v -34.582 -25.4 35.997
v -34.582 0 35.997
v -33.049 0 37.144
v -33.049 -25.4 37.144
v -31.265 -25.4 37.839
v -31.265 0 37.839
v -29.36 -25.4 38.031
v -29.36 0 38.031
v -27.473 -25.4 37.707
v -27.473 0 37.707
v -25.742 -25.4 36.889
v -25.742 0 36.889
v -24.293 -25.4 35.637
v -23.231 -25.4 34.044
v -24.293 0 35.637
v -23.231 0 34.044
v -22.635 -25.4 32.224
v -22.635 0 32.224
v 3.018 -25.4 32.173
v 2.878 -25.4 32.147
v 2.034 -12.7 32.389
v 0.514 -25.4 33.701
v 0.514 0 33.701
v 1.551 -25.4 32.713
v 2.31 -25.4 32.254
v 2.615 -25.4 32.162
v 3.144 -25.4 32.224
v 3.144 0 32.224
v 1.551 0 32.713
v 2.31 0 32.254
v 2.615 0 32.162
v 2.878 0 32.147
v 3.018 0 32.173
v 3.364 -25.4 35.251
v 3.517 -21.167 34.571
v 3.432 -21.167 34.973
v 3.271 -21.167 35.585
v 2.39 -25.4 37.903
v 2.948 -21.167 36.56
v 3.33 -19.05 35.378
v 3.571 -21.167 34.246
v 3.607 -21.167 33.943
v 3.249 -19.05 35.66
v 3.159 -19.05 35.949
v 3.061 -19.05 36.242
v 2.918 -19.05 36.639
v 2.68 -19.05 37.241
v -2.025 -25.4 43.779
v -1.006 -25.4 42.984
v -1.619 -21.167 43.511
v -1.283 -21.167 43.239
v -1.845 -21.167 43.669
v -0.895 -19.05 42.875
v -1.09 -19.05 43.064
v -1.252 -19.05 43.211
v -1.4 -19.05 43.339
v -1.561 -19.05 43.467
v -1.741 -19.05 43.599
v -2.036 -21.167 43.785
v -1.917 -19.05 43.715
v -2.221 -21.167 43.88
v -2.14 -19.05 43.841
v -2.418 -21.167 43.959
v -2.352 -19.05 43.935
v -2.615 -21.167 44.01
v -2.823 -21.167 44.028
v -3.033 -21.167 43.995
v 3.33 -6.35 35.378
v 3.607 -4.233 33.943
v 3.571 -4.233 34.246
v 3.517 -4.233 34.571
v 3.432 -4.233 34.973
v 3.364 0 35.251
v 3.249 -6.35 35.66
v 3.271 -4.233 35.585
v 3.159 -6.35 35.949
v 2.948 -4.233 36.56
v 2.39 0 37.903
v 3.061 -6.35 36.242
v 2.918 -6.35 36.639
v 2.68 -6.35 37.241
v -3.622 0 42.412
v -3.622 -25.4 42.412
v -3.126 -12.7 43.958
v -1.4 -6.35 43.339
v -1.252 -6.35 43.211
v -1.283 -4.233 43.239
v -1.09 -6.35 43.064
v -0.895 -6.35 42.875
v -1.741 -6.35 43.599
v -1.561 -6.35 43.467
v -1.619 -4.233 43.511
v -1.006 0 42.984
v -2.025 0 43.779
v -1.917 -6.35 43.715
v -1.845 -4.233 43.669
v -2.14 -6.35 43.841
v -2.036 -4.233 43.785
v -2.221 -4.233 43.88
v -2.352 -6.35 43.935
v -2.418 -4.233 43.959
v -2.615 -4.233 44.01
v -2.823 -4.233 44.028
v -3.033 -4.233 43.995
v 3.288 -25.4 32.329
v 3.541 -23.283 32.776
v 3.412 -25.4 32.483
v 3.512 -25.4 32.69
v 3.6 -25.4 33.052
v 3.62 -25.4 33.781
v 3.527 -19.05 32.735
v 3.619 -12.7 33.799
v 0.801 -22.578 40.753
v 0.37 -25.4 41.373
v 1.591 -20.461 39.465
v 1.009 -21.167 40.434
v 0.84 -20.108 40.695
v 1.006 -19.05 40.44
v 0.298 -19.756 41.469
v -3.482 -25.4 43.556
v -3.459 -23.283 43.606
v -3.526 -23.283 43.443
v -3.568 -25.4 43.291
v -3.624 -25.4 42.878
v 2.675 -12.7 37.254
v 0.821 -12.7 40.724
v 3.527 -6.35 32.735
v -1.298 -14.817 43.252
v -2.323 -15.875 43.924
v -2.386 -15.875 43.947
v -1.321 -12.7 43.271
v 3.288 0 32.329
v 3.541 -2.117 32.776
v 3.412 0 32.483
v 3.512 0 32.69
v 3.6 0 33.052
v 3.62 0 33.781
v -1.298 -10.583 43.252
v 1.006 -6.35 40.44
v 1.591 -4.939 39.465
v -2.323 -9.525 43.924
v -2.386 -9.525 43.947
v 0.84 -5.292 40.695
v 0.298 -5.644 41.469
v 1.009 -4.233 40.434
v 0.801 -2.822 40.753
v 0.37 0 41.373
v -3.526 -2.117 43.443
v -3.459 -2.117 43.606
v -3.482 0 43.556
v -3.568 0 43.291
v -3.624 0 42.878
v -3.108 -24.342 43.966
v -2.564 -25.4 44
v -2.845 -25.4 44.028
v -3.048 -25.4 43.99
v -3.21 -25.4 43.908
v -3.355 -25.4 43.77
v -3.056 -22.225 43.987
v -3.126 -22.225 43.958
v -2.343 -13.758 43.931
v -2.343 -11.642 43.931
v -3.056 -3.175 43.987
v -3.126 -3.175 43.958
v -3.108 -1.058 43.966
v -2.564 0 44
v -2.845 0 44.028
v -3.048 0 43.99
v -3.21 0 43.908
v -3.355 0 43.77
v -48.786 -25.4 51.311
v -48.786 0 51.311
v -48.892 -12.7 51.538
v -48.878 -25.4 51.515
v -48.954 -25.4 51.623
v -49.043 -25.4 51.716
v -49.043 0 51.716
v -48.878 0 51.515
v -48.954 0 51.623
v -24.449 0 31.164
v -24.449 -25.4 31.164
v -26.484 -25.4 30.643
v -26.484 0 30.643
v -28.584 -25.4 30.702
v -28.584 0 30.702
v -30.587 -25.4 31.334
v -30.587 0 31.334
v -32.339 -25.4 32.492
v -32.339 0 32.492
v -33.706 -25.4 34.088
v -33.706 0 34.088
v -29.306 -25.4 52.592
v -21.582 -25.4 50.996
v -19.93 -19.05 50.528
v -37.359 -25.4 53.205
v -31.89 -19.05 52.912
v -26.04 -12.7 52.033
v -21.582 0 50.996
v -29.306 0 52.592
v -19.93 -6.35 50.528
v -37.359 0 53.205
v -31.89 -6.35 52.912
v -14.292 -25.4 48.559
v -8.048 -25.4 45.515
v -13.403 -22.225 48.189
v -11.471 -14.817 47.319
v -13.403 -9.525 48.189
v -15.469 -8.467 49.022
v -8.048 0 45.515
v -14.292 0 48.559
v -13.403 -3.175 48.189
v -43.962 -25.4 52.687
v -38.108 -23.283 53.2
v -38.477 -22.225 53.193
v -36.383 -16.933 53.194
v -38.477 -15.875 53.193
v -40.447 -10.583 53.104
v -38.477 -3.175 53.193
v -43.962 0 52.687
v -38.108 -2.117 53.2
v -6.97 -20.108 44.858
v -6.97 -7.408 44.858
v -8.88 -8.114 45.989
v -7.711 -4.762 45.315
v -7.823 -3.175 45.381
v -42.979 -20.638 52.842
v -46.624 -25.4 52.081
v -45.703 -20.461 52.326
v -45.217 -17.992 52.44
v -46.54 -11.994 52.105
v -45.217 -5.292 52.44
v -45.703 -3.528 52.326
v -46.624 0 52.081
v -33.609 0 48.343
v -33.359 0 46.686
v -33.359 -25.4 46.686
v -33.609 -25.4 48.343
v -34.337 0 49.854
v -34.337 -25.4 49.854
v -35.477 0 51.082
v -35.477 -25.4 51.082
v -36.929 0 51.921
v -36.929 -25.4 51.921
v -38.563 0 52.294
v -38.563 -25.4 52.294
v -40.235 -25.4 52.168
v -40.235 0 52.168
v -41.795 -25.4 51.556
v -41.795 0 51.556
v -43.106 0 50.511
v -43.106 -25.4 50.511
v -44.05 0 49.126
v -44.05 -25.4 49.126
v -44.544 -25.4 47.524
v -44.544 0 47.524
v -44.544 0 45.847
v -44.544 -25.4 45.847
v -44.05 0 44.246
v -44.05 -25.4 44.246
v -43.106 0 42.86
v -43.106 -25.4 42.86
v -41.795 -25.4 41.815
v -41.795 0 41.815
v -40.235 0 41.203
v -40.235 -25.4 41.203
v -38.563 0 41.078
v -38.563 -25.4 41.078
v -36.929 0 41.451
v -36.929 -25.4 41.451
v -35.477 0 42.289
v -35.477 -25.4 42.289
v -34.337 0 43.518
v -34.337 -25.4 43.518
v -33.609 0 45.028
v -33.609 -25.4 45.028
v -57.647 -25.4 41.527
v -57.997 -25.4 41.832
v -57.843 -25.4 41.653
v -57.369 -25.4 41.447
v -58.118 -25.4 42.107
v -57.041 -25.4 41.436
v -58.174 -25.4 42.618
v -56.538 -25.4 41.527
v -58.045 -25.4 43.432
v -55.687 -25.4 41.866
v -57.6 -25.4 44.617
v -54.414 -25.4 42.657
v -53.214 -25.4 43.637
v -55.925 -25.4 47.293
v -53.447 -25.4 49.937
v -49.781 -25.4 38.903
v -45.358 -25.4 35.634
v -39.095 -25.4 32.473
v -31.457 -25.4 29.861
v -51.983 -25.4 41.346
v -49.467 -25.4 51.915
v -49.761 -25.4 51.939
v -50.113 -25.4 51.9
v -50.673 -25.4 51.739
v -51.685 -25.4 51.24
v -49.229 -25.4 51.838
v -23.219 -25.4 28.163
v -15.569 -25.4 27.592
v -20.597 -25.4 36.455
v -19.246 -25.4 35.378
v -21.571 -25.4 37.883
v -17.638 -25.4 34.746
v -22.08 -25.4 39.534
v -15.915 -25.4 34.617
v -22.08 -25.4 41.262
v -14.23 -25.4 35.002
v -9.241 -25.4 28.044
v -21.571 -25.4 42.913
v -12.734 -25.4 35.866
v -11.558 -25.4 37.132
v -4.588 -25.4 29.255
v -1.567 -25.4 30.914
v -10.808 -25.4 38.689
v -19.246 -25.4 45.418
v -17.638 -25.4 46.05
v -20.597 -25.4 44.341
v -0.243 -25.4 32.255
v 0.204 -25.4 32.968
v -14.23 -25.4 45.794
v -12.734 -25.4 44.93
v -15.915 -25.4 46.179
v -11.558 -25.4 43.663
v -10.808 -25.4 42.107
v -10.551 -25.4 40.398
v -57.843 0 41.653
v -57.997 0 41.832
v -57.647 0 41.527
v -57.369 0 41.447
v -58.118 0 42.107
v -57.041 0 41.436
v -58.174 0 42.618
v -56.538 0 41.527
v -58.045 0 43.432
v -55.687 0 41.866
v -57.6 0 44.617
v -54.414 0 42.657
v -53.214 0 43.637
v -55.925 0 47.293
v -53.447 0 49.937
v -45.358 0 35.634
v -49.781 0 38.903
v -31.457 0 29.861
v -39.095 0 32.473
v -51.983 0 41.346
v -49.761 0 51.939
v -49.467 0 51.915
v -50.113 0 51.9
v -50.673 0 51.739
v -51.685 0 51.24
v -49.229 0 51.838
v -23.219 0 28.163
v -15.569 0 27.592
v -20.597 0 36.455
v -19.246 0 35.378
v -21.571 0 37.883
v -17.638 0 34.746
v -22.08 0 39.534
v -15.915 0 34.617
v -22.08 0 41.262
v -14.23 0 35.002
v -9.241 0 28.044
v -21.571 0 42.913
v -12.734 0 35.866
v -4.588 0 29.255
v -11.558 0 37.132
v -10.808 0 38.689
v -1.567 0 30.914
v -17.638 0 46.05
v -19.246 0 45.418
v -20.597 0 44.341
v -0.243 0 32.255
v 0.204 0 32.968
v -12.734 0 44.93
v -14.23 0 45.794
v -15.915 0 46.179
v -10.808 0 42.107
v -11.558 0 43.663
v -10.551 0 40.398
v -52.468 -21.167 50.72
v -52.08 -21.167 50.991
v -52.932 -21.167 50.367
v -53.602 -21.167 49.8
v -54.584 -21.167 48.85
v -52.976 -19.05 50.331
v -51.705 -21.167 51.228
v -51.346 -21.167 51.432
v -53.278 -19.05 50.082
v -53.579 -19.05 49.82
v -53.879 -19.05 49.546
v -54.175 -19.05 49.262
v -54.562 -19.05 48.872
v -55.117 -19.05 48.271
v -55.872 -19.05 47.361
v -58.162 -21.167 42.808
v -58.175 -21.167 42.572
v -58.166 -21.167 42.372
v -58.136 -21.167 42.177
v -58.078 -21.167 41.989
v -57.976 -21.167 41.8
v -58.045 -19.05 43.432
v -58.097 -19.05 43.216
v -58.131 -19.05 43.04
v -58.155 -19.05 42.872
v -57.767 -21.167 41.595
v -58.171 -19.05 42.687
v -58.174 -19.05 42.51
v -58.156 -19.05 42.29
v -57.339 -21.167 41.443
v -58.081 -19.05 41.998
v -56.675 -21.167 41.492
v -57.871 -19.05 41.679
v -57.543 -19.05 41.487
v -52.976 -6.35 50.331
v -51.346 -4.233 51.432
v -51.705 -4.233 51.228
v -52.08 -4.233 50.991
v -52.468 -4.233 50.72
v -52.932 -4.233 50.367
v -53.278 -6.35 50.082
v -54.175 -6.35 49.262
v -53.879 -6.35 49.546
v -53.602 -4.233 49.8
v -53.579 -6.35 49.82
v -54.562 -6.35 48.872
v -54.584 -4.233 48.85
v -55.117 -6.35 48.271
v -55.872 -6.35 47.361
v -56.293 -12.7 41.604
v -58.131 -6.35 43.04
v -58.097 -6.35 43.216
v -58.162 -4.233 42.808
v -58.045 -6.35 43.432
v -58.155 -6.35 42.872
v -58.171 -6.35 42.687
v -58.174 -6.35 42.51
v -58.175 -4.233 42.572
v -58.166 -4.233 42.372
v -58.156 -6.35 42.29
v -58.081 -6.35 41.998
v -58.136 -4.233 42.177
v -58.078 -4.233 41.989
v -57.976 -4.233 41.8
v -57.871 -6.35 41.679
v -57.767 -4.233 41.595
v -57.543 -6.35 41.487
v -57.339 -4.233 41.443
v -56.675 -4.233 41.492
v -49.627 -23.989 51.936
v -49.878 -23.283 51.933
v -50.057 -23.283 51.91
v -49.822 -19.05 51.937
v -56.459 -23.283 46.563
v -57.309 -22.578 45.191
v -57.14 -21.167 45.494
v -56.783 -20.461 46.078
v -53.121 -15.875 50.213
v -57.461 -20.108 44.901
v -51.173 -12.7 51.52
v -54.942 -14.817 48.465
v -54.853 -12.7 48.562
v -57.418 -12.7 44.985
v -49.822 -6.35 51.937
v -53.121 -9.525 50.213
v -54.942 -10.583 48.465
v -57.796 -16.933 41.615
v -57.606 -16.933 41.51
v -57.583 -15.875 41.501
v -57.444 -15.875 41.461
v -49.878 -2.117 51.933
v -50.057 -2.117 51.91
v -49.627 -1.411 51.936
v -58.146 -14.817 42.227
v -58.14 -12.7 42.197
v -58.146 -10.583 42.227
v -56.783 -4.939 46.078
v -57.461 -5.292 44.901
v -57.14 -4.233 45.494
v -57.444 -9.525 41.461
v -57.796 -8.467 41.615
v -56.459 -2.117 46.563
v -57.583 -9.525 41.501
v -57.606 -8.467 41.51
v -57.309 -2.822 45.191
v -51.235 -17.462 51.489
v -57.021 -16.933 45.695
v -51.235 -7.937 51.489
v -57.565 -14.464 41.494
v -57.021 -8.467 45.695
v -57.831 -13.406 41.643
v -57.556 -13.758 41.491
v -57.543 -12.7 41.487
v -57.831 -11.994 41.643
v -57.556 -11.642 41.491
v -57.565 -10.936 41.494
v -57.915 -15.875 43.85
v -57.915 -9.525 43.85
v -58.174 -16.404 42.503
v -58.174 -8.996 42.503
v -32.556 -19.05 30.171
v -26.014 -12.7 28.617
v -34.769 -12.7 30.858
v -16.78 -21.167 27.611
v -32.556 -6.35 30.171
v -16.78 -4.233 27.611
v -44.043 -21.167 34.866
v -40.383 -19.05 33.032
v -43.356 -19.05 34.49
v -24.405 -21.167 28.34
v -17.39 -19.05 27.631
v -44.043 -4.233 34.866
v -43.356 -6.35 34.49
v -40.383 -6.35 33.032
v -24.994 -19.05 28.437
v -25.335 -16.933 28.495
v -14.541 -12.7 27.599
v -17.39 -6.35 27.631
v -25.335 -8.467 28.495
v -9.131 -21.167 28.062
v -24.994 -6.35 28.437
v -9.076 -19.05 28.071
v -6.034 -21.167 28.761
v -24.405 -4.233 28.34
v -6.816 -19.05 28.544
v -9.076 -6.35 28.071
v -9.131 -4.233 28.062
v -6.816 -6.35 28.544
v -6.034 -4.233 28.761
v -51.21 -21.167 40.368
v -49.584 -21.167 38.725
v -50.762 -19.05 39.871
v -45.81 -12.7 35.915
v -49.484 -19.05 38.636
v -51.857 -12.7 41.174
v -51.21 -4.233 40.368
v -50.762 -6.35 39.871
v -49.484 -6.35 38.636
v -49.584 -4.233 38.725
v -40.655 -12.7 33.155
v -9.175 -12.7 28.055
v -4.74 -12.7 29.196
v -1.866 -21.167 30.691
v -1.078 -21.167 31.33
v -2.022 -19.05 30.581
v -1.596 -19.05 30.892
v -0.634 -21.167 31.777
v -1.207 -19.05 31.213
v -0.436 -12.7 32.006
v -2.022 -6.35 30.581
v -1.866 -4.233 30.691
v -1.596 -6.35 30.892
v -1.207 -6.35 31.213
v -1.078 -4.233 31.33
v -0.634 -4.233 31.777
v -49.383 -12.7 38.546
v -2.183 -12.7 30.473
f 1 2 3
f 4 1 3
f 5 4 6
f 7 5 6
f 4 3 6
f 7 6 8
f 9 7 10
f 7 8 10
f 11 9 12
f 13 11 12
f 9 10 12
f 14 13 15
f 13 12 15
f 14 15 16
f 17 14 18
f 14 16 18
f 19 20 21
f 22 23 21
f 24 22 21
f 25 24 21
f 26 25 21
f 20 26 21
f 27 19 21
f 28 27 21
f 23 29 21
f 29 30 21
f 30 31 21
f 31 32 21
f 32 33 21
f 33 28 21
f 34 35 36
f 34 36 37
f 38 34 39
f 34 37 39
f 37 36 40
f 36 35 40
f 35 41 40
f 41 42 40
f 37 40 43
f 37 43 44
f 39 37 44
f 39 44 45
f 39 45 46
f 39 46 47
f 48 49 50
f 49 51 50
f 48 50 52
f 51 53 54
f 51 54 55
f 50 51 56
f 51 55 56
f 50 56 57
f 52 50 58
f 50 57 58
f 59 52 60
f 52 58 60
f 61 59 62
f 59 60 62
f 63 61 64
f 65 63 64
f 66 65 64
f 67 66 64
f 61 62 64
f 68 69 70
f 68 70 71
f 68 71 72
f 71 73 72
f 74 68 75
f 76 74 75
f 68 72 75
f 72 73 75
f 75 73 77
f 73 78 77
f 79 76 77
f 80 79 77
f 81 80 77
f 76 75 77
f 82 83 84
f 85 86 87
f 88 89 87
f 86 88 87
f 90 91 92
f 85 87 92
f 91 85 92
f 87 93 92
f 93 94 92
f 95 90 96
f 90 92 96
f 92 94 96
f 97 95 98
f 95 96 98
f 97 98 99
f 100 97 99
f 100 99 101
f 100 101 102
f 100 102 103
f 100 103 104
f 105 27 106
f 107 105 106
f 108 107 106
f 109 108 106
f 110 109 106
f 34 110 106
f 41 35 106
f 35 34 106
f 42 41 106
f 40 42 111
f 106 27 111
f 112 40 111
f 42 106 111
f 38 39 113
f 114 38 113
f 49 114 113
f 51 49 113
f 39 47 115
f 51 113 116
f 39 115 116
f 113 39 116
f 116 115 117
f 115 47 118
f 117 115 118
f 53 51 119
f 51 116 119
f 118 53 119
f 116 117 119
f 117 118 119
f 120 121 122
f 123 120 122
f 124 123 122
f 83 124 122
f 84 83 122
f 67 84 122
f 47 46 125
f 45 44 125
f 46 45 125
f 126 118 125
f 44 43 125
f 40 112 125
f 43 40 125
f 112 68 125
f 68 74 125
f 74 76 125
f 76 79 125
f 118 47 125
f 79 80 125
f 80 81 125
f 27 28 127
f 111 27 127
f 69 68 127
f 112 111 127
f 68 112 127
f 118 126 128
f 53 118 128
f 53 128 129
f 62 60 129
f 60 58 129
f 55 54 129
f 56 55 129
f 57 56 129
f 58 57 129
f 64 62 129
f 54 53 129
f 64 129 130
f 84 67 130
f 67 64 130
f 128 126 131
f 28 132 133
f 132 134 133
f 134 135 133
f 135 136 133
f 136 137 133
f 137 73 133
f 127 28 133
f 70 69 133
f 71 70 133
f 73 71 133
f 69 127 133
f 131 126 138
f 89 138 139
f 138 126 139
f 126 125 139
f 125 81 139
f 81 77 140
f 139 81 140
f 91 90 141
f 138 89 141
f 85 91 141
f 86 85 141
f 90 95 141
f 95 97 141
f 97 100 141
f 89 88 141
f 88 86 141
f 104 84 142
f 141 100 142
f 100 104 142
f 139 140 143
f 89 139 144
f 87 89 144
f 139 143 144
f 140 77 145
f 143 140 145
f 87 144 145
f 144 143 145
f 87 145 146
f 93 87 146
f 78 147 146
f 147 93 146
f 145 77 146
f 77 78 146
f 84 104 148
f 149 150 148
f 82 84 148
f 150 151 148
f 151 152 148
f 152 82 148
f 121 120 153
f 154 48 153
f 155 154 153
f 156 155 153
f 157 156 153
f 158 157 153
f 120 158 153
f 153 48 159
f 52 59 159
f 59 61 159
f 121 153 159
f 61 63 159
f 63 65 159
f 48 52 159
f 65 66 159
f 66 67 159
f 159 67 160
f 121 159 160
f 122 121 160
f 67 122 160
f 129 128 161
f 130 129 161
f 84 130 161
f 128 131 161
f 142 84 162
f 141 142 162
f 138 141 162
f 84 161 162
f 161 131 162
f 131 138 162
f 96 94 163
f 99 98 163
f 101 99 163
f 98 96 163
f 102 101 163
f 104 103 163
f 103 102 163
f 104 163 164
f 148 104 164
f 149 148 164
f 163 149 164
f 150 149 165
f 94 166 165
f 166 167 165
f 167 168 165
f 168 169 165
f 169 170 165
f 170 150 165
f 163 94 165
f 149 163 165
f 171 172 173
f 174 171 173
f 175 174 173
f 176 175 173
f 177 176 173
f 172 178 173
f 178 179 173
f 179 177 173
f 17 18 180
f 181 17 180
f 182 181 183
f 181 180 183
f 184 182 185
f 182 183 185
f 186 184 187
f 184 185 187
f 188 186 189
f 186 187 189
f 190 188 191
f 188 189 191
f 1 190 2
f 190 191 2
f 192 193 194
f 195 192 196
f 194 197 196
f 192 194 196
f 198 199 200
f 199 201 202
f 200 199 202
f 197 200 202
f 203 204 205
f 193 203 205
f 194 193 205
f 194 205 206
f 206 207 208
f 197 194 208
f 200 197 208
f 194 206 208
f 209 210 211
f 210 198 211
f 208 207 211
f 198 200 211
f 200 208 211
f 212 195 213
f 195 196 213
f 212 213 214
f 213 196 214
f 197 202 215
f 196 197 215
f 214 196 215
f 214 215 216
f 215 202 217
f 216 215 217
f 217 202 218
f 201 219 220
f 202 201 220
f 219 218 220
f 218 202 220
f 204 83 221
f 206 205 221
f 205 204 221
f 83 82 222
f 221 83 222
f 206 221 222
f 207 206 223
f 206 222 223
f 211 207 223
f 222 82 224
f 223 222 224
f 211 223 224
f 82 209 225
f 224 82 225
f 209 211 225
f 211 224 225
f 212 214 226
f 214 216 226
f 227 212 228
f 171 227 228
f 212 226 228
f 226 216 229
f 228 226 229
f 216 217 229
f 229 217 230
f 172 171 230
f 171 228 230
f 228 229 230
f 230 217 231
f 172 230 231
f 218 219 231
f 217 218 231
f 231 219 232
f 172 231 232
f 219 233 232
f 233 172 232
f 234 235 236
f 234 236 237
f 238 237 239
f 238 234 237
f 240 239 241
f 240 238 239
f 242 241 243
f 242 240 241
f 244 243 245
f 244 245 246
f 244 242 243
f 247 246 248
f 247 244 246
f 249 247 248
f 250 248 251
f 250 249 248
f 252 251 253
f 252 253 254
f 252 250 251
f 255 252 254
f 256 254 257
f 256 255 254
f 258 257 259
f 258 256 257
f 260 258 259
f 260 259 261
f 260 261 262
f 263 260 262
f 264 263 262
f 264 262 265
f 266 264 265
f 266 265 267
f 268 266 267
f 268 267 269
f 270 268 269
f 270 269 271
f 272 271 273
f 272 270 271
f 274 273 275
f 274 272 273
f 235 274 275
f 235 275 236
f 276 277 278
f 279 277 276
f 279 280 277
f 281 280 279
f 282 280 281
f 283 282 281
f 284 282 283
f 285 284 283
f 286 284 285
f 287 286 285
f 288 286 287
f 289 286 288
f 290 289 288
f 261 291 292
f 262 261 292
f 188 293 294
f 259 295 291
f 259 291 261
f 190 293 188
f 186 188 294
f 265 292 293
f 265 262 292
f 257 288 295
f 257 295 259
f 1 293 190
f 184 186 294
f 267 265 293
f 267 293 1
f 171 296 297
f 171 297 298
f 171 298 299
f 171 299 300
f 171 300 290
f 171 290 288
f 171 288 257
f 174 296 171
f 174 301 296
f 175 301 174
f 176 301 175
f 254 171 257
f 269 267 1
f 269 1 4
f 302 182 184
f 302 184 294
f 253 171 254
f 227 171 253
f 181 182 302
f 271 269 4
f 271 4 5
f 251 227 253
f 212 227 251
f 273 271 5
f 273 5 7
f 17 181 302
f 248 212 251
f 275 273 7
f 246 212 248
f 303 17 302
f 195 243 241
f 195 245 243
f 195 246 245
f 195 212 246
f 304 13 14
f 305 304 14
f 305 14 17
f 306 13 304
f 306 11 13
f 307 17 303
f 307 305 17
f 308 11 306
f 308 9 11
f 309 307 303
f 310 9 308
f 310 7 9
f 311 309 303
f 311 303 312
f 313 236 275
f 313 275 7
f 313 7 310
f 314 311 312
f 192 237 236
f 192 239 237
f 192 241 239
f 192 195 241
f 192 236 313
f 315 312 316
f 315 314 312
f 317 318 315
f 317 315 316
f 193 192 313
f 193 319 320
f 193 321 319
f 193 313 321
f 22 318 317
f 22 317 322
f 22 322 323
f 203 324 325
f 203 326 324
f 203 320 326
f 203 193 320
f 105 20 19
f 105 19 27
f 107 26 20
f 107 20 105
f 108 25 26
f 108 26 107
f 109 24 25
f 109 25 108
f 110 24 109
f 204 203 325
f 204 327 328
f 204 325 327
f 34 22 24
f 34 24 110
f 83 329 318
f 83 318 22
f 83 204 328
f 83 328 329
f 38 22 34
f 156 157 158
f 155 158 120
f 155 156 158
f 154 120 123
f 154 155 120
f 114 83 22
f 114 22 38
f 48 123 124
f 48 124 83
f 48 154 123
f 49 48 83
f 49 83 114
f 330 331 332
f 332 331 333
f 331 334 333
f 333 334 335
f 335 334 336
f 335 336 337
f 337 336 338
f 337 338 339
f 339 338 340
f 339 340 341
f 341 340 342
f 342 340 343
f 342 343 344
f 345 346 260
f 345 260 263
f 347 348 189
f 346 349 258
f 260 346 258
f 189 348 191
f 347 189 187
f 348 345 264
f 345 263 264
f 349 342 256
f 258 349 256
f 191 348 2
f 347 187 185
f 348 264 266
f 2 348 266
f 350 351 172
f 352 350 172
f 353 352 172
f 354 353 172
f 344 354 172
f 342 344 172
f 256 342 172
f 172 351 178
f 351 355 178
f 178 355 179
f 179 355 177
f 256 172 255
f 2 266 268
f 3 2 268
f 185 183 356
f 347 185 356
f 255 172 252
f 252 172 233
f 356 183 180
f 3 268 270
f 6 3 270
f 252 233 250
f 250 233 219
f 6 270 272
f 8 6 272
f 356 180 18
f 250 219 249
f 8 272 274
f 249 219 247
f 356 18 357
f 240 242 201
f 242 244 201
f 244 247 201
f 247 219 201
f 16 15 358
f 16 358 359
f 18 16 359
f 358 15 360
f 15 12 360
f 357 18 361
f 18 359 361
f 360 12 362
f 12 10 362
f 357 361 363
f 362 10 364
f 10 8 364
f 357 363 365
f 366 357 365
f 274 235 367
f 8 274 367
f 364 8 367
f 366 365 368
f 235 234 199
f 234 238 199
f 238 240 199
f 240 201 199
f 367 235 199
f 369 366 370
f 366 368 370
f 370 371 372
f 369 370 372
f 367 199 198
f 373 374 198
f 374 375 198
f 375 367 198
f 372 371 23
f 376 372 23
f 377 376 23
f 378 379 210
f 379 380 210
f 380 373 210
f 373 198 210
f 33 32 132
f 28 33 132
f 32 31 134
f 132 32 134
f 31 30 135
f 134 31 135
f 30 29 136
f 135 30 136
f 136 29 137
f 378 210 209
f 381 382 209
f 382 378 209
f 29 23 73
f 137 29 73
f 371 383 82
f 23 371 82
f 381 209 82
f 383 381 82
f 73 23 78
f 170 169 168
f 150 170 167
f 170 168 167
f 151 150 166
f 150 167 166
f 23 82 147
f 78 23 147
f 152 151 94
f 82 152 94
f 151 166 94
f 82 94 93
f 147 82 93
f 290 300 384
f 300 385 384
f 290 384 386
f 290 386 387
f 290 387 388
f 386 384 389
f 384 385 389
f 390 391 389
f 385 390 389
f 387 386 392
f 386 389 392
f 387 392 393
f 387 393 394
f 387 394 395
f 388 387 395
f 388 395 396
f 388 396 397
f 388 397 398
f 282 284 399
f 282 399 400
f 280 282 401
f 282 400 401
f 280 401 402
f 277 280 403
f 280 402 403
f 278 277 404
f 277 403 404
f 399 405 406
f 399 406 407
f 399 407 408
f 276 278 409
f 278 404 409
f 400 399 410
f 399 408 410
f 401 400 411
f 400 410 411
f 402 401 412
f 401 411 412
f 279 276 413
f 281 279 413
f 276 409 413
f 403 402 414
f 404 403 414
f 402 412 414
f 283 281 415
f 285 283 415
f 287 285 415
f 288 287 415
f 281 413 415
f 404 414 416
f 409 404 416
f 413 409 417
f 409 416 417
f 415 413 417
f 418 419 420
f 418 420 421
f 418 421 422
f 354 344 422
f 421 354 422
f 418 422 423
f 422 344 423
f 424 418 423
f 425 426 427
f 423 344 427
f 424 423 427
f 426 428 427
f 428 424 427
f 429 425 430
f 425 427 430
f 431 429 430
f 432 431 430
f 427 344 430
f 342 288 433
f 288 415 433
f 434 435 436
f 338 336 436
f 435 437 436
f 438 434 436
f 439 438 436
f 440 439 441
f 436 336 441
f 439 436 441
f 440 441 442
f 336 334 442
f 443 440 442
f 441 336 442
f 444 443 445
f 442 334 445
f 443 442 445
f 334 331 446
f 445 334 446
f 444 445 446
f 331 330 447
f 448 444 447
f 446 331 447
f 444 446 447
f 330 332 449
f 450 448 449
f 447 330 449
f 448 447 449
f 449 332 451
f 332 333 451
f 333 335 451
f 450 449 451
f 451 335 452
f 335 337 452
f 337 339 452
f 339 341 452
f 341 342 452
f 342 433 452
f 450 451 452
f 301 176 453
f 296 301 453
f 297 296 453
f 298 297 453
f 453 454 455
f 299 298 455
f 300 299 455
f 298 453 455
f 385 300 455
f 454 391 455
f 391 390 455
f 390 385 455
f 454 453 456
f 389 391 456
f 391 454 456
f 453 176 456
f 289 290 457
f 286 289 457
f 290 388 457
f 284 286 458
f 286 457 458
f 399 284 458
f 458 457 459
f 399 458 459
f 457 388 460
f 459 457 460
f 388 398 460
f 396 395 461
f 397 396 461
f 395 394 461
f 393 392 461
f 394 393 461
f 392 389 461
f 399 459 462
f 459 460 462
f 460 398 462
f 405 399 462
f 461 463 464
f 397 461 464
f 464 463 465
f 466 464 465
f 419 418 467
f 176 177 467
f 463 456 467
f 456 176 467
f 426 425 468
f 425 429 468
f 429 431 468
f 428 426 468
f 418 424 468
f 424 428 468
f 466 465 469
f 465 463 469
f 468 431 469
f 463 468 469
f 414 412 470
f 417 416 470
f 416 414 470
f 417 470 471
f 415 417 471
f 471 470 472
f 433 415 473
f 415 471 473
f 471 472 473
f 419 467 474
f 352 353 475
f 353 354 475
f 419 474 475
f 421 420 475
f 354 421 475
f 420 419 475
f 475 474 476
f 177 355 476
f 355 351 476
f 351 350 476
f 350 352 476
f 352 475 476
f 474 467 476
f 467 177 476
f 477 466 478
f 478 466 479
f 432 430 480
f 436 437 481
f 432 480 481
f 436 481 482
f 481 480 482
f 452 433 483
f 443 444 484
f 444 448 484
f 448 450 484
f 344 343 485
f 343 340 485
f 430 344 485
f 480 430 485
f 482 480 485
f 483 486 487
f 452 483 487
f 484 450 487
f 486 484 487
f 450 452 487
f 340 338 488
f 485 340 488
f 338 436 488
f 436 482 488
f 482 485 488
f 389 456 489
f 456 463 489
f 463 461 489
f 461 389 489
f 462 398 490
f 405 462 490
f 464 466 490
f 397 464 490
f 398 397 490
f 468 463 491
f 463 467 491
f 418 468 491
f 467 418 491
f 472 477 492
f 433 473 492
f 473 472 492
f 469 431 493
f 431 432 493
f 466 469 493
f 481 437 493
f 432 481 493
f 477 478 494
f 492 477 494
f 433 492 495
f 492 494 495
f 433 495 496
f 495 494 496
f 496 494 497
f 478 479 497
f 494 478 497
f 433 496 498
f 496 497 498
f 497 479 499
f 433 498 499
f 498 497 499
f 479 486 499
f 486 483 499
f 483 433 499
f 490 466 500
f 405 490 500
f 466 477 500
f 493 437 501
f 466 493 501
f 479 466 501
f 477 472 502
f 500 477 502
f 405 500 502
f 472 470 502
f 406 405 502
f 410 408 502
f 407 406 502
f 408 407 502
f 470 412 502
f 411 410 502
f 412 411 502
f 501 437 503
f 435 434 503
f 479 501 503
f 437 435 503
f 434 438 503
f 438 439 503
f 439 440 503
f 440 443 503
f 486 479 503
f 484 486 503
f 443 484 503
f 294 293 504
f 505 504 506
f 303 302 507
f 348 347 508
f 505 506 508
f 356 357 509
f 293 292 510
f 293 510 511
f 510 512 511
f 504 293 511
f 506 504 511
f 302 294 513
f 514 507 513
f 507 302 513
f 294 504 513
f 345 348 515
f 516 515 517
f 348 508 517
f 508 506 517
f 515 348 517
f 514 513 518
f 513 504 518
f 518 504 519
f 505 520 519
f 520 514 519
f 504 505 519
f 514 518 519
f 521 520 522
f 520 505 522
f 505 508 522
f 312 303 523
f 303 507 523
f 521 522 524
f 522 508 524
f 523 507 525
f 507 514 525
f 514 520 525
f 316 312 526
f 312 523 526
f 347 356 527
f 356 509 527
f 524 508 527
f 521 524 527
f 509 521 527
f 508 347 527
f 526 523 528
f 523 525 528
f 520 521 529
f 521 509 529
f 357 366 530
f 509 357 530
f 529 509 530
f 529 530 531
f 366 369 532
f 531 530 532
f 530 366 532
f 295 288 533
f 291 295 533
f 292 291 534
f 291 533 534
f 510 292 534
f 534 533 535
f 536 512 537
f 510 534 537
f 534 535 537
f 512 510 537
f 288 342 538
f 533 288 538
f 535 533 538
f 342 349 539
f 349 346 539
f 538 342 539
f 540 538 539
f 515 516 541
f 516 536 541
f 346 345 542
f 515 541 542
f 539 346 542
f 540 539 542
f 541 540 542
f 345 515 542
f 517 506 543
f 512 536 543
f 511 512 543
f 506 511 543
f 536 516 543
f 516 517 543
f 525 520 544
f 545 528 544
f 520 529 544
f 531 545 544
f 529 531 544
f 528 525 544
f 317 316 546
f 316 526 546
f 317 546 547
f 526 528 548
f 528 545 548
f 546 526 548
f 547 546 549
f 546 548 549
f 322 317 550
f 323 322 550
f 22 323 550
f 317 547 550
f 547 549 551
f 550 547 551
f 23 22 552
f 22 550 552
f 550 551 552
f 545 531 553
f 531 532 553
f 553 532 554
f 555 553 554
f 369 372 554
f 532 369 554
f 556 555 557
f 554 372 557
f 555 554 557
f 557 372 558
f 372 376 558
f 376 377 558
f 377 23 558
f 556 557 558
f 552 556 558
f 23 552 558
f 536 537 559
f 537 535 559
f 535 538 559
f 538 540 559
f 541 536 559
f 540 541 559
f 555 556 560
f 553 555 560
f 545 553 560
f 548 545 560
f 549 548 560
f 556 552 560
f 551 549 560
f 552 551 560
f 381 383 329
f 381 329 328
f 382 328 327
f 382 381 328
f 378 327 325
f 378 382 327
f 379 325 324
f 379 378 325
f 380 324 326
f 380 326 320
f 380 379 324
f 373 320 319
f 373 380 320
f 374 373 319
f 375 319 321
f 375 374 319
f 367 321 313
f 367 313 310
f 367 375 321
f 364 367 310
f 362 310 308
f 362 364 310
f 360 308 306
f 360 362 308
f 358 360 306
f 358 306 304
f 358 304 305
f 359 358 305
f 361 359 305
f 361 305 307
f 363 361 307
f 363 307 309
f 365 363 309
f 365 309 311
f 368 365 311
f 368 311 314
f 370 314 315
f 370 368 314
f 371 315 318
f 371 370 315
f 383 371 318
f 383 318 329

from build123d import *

# Parameters (mm, degrees)
F0_R     = 5.623821154
F0_R_2   = 5.7969004421
F1_DEPTH = 25.4


with BuildPart() as f1:
    # F0 (on Front) → F1 (new body)
    with BuildSketch(Plane.XZ):
        with BuildLine():
            add(Edge.make_bspline(
                [(0.513953933, 33.7009599132), (0.5806385314, 33.9034228433), (0.6287617143, 34.110352397)],
                knots=[6.2460954795, 6.2460954795, 6.2460954795, 6.2831853072, 6.2831853072, 6.2831853072], degree=2, weights=[1, 0.999828048, 1]))
            add(Edge.make_bspline(
                [(0.6287617143, 34.110352397), (1.5336829013, 38.0015110013), (-3.6216792375, 42.4124403142)],
                knots=[0, 0, 0, 0.6711456646, 0.6711456646, 0.6711456646], degree=2, weights=[1, 0.9442218251, 1]))
            add(Edge.make_bspline(
                [(-3.6216792375, 42.4124403142), (-3.3582820184, 38.0223684233), (0.513953933, 33.7009599132)],
                knots=[3.7324633472, 3.7324633472, 3.7324633472, 5.3779376636, 5.3779376636, 5.3779376636], degree=2, weights=[1, 0.6802173924, 1]))
        make_face()
        with BuildLine():
            add(Edge.make_bspline(
                [(0.6287617143, 34.110352397), (1.5336829013, 38.0015110013), (-3.6216792375, 42.4124403142)],
                knots=[0, 0, 0, 0.6711456646, 0.6711456646, 0.6711456646], degree=2, weights=[1, 0.9442218251, 1]))
            add(Edge.make_bspline(
                [(0.513953933, 33.7009599132), (0.5806385314, 33.9034228433), (0.6287617143, 34.110352397)],
                knots=[6.2460954795, 6.2460954795, 6.2460954795, 6.2831853072, 6.2831853072, 6.2831853072], degree=2, weights=[1, 0.999828048, 1]))
            add(Edge.make_bspline(
                [(0.513953933, 33.7009599132), (2.261382433, 31.750832781), (3.1438113656, 32.2240665555)],
                knots=[5.3779376636, 5.3779376636, 5.3779376636, 6.2831853072, 6.2831853072, 6.2831853072], degree=2, weights=[1, 0.8993027321, 1]))
            add(Edge.make_bspline(
                [(3.1438113656, 32.2240665555), (5.5928402598, 33.5374450552), (0.8206378635, 40.7240608556), (-3.9515645328, 47.910676656), (-3.6216792375, 42.4124403142)],
                knots=[0, 0, 0, 1.8662316736, 1.8662316736, 3.7324633472, 3.7324633472, 3.7324633472], degree=2, weights=[1, 0.5953333674, 1, 0.5953333674, 1]))
        make_face()
        with BuildLine():
            add(Edge.make_bspline(
                [(-3.6216792375, 42.4124403142), (-3.3582820184, 38.0223684233), (0.513953933, 33.7009599132)],
                knots=[3.7324633472, 3.7324633472, 3.7324633472, 5.3779376636, 5.3779376636, 5.3779376636], degree=2, weights=[1, 0.6802173924, 1]))
            add(Edge.make_bspline(
                [(-3.6216792375, 42.4124403142), (-25.7463495836, 61.3423145573), (-48.7859496914, 51.3111059467)],
                knots=[0.6711456646, 0.6711456646, 0.6711456646, 2.6347288015, 2.6347288015, 2.6347288015], degree=2, weights=[1, 0.5555337607, 1]))
            add(Edge.make_bspline(
                [(-53.2142940351, 43.6374274334), (-47.8590594627, 48.487584817), (-48.7859496914, 51.3111059467)],
                knots=[4.3861264922, 4.3861264922, 4.3861264922, 6.08192085, 6.08192085, 6.08192085], degree=2, weights=[1, 0.6615614938, 1]))
            add(Edge.make_bspline(
                [(-53.2142940351, 43.6374274334), (-49.440208617, 32.9496682343), (-26.0138220852, 28.617207421), (-2.5874355533, 24.2847466077), (0.513953933, 33.7009599132)],
                knots=[3.3990592992, 3.3990592992, 3.3990592992, 4.8225773894, 4.8225773894, 6.2460954795, 6.2460954795, 6.2460954795], degree=2, weights=[1, 0.7572140983, 1, 0.7572140983, 1]))
        make_face()
        with BuildLine():
            ThreePointArc((-34.58192572, 35.9966419637), (-27.472985966, 37.7067308537), (-22.6354431361, 32.2240665555))
            ThreePointArc((-22.6354431361, 32.2240665555), (-29.6073079103, 30.9480482094), (-34.58192572, 35.9966419637))
        make_face(mode=Mode.SUBTRACT)
        with Locations((-38.9832630754, 46.6855987906)):
            Circle(F0_R, mode=Mode.SUBTRACT)
        with Locations((-16.3478180766, 40.3979793191)):
            Circle(F0_R_2, mode=Mode.SUBTRACT)
        with BuildLine():
            add(Edge.make_bspline(
                [(-53.2142940351, 43.6374274334), (-47.8590594627, 48.487584817), (-48.7859496914, 51.3111059467)],
                knots=[4.3861264922, 4.3861264922, 4.3861264922, 6.08192085, 6.08192085, 6.08192085], degree=2, weights=[1, 0.6615614938, 1]))
            add(Edge.make_bspline(
                [(-48.7859496914, 51.3111059467), (-54.9728329452, 48.6173996203), (-53.2142940351, 43.6374274334)],
                knots=[2.6347288015, 2.6347288015, 2.6347288015, 3.3990592992, 3.3990592992, 3.3990592992], degree=2, weights=[1, 0.9278593242, 1]))
        make_face()
        with BuildLine():
            add(Edge.make_bspline(
                [(-48.7859496914, 51.3111059467), (-54.9728329452, 48.6173996203), (-53.2142940351, 43.6374274334)],
                knots=[2.6347288015, 2.6347288015, 2.6347288015, 3.3990592992, 3.3990592992, 3.3990592992], degree=2, weights=[1, 0.9278593242, 1]))
            add(Edge.make_bspline(
                [(-48.7859496914, 51.3111059467), (-48.8685167863, 51.5626243357), (-49.0434579551, 51.7156980932)],
                knots=[6.08192085, 6.08192085, 6.08192085, 6.2831853072, 6.2831853072, 6.2831853072], degree=2, weights=[1, 0.9949408489, 1]))
            add(Edge.make_bspline(
                [(-49.0434579551, 51.7156980932), (-52.4184912193, 54.6688567297), (-57.4180389624, 44.9854985082), (-62.4175867056, 35.3021402867), (-53.2142940351, 43.6374274334)],
                knots=[0, 0, 0, 2.1930632461, 2.1930632461, 4.3861264922, 4.3861264922, 4.3861264922], degree=2, weights=[1, 0.45668443, 1, 0.45668443, 1]))
        make_face()
    extrude(amount=F1_DEPTH)


solid = f1.part
